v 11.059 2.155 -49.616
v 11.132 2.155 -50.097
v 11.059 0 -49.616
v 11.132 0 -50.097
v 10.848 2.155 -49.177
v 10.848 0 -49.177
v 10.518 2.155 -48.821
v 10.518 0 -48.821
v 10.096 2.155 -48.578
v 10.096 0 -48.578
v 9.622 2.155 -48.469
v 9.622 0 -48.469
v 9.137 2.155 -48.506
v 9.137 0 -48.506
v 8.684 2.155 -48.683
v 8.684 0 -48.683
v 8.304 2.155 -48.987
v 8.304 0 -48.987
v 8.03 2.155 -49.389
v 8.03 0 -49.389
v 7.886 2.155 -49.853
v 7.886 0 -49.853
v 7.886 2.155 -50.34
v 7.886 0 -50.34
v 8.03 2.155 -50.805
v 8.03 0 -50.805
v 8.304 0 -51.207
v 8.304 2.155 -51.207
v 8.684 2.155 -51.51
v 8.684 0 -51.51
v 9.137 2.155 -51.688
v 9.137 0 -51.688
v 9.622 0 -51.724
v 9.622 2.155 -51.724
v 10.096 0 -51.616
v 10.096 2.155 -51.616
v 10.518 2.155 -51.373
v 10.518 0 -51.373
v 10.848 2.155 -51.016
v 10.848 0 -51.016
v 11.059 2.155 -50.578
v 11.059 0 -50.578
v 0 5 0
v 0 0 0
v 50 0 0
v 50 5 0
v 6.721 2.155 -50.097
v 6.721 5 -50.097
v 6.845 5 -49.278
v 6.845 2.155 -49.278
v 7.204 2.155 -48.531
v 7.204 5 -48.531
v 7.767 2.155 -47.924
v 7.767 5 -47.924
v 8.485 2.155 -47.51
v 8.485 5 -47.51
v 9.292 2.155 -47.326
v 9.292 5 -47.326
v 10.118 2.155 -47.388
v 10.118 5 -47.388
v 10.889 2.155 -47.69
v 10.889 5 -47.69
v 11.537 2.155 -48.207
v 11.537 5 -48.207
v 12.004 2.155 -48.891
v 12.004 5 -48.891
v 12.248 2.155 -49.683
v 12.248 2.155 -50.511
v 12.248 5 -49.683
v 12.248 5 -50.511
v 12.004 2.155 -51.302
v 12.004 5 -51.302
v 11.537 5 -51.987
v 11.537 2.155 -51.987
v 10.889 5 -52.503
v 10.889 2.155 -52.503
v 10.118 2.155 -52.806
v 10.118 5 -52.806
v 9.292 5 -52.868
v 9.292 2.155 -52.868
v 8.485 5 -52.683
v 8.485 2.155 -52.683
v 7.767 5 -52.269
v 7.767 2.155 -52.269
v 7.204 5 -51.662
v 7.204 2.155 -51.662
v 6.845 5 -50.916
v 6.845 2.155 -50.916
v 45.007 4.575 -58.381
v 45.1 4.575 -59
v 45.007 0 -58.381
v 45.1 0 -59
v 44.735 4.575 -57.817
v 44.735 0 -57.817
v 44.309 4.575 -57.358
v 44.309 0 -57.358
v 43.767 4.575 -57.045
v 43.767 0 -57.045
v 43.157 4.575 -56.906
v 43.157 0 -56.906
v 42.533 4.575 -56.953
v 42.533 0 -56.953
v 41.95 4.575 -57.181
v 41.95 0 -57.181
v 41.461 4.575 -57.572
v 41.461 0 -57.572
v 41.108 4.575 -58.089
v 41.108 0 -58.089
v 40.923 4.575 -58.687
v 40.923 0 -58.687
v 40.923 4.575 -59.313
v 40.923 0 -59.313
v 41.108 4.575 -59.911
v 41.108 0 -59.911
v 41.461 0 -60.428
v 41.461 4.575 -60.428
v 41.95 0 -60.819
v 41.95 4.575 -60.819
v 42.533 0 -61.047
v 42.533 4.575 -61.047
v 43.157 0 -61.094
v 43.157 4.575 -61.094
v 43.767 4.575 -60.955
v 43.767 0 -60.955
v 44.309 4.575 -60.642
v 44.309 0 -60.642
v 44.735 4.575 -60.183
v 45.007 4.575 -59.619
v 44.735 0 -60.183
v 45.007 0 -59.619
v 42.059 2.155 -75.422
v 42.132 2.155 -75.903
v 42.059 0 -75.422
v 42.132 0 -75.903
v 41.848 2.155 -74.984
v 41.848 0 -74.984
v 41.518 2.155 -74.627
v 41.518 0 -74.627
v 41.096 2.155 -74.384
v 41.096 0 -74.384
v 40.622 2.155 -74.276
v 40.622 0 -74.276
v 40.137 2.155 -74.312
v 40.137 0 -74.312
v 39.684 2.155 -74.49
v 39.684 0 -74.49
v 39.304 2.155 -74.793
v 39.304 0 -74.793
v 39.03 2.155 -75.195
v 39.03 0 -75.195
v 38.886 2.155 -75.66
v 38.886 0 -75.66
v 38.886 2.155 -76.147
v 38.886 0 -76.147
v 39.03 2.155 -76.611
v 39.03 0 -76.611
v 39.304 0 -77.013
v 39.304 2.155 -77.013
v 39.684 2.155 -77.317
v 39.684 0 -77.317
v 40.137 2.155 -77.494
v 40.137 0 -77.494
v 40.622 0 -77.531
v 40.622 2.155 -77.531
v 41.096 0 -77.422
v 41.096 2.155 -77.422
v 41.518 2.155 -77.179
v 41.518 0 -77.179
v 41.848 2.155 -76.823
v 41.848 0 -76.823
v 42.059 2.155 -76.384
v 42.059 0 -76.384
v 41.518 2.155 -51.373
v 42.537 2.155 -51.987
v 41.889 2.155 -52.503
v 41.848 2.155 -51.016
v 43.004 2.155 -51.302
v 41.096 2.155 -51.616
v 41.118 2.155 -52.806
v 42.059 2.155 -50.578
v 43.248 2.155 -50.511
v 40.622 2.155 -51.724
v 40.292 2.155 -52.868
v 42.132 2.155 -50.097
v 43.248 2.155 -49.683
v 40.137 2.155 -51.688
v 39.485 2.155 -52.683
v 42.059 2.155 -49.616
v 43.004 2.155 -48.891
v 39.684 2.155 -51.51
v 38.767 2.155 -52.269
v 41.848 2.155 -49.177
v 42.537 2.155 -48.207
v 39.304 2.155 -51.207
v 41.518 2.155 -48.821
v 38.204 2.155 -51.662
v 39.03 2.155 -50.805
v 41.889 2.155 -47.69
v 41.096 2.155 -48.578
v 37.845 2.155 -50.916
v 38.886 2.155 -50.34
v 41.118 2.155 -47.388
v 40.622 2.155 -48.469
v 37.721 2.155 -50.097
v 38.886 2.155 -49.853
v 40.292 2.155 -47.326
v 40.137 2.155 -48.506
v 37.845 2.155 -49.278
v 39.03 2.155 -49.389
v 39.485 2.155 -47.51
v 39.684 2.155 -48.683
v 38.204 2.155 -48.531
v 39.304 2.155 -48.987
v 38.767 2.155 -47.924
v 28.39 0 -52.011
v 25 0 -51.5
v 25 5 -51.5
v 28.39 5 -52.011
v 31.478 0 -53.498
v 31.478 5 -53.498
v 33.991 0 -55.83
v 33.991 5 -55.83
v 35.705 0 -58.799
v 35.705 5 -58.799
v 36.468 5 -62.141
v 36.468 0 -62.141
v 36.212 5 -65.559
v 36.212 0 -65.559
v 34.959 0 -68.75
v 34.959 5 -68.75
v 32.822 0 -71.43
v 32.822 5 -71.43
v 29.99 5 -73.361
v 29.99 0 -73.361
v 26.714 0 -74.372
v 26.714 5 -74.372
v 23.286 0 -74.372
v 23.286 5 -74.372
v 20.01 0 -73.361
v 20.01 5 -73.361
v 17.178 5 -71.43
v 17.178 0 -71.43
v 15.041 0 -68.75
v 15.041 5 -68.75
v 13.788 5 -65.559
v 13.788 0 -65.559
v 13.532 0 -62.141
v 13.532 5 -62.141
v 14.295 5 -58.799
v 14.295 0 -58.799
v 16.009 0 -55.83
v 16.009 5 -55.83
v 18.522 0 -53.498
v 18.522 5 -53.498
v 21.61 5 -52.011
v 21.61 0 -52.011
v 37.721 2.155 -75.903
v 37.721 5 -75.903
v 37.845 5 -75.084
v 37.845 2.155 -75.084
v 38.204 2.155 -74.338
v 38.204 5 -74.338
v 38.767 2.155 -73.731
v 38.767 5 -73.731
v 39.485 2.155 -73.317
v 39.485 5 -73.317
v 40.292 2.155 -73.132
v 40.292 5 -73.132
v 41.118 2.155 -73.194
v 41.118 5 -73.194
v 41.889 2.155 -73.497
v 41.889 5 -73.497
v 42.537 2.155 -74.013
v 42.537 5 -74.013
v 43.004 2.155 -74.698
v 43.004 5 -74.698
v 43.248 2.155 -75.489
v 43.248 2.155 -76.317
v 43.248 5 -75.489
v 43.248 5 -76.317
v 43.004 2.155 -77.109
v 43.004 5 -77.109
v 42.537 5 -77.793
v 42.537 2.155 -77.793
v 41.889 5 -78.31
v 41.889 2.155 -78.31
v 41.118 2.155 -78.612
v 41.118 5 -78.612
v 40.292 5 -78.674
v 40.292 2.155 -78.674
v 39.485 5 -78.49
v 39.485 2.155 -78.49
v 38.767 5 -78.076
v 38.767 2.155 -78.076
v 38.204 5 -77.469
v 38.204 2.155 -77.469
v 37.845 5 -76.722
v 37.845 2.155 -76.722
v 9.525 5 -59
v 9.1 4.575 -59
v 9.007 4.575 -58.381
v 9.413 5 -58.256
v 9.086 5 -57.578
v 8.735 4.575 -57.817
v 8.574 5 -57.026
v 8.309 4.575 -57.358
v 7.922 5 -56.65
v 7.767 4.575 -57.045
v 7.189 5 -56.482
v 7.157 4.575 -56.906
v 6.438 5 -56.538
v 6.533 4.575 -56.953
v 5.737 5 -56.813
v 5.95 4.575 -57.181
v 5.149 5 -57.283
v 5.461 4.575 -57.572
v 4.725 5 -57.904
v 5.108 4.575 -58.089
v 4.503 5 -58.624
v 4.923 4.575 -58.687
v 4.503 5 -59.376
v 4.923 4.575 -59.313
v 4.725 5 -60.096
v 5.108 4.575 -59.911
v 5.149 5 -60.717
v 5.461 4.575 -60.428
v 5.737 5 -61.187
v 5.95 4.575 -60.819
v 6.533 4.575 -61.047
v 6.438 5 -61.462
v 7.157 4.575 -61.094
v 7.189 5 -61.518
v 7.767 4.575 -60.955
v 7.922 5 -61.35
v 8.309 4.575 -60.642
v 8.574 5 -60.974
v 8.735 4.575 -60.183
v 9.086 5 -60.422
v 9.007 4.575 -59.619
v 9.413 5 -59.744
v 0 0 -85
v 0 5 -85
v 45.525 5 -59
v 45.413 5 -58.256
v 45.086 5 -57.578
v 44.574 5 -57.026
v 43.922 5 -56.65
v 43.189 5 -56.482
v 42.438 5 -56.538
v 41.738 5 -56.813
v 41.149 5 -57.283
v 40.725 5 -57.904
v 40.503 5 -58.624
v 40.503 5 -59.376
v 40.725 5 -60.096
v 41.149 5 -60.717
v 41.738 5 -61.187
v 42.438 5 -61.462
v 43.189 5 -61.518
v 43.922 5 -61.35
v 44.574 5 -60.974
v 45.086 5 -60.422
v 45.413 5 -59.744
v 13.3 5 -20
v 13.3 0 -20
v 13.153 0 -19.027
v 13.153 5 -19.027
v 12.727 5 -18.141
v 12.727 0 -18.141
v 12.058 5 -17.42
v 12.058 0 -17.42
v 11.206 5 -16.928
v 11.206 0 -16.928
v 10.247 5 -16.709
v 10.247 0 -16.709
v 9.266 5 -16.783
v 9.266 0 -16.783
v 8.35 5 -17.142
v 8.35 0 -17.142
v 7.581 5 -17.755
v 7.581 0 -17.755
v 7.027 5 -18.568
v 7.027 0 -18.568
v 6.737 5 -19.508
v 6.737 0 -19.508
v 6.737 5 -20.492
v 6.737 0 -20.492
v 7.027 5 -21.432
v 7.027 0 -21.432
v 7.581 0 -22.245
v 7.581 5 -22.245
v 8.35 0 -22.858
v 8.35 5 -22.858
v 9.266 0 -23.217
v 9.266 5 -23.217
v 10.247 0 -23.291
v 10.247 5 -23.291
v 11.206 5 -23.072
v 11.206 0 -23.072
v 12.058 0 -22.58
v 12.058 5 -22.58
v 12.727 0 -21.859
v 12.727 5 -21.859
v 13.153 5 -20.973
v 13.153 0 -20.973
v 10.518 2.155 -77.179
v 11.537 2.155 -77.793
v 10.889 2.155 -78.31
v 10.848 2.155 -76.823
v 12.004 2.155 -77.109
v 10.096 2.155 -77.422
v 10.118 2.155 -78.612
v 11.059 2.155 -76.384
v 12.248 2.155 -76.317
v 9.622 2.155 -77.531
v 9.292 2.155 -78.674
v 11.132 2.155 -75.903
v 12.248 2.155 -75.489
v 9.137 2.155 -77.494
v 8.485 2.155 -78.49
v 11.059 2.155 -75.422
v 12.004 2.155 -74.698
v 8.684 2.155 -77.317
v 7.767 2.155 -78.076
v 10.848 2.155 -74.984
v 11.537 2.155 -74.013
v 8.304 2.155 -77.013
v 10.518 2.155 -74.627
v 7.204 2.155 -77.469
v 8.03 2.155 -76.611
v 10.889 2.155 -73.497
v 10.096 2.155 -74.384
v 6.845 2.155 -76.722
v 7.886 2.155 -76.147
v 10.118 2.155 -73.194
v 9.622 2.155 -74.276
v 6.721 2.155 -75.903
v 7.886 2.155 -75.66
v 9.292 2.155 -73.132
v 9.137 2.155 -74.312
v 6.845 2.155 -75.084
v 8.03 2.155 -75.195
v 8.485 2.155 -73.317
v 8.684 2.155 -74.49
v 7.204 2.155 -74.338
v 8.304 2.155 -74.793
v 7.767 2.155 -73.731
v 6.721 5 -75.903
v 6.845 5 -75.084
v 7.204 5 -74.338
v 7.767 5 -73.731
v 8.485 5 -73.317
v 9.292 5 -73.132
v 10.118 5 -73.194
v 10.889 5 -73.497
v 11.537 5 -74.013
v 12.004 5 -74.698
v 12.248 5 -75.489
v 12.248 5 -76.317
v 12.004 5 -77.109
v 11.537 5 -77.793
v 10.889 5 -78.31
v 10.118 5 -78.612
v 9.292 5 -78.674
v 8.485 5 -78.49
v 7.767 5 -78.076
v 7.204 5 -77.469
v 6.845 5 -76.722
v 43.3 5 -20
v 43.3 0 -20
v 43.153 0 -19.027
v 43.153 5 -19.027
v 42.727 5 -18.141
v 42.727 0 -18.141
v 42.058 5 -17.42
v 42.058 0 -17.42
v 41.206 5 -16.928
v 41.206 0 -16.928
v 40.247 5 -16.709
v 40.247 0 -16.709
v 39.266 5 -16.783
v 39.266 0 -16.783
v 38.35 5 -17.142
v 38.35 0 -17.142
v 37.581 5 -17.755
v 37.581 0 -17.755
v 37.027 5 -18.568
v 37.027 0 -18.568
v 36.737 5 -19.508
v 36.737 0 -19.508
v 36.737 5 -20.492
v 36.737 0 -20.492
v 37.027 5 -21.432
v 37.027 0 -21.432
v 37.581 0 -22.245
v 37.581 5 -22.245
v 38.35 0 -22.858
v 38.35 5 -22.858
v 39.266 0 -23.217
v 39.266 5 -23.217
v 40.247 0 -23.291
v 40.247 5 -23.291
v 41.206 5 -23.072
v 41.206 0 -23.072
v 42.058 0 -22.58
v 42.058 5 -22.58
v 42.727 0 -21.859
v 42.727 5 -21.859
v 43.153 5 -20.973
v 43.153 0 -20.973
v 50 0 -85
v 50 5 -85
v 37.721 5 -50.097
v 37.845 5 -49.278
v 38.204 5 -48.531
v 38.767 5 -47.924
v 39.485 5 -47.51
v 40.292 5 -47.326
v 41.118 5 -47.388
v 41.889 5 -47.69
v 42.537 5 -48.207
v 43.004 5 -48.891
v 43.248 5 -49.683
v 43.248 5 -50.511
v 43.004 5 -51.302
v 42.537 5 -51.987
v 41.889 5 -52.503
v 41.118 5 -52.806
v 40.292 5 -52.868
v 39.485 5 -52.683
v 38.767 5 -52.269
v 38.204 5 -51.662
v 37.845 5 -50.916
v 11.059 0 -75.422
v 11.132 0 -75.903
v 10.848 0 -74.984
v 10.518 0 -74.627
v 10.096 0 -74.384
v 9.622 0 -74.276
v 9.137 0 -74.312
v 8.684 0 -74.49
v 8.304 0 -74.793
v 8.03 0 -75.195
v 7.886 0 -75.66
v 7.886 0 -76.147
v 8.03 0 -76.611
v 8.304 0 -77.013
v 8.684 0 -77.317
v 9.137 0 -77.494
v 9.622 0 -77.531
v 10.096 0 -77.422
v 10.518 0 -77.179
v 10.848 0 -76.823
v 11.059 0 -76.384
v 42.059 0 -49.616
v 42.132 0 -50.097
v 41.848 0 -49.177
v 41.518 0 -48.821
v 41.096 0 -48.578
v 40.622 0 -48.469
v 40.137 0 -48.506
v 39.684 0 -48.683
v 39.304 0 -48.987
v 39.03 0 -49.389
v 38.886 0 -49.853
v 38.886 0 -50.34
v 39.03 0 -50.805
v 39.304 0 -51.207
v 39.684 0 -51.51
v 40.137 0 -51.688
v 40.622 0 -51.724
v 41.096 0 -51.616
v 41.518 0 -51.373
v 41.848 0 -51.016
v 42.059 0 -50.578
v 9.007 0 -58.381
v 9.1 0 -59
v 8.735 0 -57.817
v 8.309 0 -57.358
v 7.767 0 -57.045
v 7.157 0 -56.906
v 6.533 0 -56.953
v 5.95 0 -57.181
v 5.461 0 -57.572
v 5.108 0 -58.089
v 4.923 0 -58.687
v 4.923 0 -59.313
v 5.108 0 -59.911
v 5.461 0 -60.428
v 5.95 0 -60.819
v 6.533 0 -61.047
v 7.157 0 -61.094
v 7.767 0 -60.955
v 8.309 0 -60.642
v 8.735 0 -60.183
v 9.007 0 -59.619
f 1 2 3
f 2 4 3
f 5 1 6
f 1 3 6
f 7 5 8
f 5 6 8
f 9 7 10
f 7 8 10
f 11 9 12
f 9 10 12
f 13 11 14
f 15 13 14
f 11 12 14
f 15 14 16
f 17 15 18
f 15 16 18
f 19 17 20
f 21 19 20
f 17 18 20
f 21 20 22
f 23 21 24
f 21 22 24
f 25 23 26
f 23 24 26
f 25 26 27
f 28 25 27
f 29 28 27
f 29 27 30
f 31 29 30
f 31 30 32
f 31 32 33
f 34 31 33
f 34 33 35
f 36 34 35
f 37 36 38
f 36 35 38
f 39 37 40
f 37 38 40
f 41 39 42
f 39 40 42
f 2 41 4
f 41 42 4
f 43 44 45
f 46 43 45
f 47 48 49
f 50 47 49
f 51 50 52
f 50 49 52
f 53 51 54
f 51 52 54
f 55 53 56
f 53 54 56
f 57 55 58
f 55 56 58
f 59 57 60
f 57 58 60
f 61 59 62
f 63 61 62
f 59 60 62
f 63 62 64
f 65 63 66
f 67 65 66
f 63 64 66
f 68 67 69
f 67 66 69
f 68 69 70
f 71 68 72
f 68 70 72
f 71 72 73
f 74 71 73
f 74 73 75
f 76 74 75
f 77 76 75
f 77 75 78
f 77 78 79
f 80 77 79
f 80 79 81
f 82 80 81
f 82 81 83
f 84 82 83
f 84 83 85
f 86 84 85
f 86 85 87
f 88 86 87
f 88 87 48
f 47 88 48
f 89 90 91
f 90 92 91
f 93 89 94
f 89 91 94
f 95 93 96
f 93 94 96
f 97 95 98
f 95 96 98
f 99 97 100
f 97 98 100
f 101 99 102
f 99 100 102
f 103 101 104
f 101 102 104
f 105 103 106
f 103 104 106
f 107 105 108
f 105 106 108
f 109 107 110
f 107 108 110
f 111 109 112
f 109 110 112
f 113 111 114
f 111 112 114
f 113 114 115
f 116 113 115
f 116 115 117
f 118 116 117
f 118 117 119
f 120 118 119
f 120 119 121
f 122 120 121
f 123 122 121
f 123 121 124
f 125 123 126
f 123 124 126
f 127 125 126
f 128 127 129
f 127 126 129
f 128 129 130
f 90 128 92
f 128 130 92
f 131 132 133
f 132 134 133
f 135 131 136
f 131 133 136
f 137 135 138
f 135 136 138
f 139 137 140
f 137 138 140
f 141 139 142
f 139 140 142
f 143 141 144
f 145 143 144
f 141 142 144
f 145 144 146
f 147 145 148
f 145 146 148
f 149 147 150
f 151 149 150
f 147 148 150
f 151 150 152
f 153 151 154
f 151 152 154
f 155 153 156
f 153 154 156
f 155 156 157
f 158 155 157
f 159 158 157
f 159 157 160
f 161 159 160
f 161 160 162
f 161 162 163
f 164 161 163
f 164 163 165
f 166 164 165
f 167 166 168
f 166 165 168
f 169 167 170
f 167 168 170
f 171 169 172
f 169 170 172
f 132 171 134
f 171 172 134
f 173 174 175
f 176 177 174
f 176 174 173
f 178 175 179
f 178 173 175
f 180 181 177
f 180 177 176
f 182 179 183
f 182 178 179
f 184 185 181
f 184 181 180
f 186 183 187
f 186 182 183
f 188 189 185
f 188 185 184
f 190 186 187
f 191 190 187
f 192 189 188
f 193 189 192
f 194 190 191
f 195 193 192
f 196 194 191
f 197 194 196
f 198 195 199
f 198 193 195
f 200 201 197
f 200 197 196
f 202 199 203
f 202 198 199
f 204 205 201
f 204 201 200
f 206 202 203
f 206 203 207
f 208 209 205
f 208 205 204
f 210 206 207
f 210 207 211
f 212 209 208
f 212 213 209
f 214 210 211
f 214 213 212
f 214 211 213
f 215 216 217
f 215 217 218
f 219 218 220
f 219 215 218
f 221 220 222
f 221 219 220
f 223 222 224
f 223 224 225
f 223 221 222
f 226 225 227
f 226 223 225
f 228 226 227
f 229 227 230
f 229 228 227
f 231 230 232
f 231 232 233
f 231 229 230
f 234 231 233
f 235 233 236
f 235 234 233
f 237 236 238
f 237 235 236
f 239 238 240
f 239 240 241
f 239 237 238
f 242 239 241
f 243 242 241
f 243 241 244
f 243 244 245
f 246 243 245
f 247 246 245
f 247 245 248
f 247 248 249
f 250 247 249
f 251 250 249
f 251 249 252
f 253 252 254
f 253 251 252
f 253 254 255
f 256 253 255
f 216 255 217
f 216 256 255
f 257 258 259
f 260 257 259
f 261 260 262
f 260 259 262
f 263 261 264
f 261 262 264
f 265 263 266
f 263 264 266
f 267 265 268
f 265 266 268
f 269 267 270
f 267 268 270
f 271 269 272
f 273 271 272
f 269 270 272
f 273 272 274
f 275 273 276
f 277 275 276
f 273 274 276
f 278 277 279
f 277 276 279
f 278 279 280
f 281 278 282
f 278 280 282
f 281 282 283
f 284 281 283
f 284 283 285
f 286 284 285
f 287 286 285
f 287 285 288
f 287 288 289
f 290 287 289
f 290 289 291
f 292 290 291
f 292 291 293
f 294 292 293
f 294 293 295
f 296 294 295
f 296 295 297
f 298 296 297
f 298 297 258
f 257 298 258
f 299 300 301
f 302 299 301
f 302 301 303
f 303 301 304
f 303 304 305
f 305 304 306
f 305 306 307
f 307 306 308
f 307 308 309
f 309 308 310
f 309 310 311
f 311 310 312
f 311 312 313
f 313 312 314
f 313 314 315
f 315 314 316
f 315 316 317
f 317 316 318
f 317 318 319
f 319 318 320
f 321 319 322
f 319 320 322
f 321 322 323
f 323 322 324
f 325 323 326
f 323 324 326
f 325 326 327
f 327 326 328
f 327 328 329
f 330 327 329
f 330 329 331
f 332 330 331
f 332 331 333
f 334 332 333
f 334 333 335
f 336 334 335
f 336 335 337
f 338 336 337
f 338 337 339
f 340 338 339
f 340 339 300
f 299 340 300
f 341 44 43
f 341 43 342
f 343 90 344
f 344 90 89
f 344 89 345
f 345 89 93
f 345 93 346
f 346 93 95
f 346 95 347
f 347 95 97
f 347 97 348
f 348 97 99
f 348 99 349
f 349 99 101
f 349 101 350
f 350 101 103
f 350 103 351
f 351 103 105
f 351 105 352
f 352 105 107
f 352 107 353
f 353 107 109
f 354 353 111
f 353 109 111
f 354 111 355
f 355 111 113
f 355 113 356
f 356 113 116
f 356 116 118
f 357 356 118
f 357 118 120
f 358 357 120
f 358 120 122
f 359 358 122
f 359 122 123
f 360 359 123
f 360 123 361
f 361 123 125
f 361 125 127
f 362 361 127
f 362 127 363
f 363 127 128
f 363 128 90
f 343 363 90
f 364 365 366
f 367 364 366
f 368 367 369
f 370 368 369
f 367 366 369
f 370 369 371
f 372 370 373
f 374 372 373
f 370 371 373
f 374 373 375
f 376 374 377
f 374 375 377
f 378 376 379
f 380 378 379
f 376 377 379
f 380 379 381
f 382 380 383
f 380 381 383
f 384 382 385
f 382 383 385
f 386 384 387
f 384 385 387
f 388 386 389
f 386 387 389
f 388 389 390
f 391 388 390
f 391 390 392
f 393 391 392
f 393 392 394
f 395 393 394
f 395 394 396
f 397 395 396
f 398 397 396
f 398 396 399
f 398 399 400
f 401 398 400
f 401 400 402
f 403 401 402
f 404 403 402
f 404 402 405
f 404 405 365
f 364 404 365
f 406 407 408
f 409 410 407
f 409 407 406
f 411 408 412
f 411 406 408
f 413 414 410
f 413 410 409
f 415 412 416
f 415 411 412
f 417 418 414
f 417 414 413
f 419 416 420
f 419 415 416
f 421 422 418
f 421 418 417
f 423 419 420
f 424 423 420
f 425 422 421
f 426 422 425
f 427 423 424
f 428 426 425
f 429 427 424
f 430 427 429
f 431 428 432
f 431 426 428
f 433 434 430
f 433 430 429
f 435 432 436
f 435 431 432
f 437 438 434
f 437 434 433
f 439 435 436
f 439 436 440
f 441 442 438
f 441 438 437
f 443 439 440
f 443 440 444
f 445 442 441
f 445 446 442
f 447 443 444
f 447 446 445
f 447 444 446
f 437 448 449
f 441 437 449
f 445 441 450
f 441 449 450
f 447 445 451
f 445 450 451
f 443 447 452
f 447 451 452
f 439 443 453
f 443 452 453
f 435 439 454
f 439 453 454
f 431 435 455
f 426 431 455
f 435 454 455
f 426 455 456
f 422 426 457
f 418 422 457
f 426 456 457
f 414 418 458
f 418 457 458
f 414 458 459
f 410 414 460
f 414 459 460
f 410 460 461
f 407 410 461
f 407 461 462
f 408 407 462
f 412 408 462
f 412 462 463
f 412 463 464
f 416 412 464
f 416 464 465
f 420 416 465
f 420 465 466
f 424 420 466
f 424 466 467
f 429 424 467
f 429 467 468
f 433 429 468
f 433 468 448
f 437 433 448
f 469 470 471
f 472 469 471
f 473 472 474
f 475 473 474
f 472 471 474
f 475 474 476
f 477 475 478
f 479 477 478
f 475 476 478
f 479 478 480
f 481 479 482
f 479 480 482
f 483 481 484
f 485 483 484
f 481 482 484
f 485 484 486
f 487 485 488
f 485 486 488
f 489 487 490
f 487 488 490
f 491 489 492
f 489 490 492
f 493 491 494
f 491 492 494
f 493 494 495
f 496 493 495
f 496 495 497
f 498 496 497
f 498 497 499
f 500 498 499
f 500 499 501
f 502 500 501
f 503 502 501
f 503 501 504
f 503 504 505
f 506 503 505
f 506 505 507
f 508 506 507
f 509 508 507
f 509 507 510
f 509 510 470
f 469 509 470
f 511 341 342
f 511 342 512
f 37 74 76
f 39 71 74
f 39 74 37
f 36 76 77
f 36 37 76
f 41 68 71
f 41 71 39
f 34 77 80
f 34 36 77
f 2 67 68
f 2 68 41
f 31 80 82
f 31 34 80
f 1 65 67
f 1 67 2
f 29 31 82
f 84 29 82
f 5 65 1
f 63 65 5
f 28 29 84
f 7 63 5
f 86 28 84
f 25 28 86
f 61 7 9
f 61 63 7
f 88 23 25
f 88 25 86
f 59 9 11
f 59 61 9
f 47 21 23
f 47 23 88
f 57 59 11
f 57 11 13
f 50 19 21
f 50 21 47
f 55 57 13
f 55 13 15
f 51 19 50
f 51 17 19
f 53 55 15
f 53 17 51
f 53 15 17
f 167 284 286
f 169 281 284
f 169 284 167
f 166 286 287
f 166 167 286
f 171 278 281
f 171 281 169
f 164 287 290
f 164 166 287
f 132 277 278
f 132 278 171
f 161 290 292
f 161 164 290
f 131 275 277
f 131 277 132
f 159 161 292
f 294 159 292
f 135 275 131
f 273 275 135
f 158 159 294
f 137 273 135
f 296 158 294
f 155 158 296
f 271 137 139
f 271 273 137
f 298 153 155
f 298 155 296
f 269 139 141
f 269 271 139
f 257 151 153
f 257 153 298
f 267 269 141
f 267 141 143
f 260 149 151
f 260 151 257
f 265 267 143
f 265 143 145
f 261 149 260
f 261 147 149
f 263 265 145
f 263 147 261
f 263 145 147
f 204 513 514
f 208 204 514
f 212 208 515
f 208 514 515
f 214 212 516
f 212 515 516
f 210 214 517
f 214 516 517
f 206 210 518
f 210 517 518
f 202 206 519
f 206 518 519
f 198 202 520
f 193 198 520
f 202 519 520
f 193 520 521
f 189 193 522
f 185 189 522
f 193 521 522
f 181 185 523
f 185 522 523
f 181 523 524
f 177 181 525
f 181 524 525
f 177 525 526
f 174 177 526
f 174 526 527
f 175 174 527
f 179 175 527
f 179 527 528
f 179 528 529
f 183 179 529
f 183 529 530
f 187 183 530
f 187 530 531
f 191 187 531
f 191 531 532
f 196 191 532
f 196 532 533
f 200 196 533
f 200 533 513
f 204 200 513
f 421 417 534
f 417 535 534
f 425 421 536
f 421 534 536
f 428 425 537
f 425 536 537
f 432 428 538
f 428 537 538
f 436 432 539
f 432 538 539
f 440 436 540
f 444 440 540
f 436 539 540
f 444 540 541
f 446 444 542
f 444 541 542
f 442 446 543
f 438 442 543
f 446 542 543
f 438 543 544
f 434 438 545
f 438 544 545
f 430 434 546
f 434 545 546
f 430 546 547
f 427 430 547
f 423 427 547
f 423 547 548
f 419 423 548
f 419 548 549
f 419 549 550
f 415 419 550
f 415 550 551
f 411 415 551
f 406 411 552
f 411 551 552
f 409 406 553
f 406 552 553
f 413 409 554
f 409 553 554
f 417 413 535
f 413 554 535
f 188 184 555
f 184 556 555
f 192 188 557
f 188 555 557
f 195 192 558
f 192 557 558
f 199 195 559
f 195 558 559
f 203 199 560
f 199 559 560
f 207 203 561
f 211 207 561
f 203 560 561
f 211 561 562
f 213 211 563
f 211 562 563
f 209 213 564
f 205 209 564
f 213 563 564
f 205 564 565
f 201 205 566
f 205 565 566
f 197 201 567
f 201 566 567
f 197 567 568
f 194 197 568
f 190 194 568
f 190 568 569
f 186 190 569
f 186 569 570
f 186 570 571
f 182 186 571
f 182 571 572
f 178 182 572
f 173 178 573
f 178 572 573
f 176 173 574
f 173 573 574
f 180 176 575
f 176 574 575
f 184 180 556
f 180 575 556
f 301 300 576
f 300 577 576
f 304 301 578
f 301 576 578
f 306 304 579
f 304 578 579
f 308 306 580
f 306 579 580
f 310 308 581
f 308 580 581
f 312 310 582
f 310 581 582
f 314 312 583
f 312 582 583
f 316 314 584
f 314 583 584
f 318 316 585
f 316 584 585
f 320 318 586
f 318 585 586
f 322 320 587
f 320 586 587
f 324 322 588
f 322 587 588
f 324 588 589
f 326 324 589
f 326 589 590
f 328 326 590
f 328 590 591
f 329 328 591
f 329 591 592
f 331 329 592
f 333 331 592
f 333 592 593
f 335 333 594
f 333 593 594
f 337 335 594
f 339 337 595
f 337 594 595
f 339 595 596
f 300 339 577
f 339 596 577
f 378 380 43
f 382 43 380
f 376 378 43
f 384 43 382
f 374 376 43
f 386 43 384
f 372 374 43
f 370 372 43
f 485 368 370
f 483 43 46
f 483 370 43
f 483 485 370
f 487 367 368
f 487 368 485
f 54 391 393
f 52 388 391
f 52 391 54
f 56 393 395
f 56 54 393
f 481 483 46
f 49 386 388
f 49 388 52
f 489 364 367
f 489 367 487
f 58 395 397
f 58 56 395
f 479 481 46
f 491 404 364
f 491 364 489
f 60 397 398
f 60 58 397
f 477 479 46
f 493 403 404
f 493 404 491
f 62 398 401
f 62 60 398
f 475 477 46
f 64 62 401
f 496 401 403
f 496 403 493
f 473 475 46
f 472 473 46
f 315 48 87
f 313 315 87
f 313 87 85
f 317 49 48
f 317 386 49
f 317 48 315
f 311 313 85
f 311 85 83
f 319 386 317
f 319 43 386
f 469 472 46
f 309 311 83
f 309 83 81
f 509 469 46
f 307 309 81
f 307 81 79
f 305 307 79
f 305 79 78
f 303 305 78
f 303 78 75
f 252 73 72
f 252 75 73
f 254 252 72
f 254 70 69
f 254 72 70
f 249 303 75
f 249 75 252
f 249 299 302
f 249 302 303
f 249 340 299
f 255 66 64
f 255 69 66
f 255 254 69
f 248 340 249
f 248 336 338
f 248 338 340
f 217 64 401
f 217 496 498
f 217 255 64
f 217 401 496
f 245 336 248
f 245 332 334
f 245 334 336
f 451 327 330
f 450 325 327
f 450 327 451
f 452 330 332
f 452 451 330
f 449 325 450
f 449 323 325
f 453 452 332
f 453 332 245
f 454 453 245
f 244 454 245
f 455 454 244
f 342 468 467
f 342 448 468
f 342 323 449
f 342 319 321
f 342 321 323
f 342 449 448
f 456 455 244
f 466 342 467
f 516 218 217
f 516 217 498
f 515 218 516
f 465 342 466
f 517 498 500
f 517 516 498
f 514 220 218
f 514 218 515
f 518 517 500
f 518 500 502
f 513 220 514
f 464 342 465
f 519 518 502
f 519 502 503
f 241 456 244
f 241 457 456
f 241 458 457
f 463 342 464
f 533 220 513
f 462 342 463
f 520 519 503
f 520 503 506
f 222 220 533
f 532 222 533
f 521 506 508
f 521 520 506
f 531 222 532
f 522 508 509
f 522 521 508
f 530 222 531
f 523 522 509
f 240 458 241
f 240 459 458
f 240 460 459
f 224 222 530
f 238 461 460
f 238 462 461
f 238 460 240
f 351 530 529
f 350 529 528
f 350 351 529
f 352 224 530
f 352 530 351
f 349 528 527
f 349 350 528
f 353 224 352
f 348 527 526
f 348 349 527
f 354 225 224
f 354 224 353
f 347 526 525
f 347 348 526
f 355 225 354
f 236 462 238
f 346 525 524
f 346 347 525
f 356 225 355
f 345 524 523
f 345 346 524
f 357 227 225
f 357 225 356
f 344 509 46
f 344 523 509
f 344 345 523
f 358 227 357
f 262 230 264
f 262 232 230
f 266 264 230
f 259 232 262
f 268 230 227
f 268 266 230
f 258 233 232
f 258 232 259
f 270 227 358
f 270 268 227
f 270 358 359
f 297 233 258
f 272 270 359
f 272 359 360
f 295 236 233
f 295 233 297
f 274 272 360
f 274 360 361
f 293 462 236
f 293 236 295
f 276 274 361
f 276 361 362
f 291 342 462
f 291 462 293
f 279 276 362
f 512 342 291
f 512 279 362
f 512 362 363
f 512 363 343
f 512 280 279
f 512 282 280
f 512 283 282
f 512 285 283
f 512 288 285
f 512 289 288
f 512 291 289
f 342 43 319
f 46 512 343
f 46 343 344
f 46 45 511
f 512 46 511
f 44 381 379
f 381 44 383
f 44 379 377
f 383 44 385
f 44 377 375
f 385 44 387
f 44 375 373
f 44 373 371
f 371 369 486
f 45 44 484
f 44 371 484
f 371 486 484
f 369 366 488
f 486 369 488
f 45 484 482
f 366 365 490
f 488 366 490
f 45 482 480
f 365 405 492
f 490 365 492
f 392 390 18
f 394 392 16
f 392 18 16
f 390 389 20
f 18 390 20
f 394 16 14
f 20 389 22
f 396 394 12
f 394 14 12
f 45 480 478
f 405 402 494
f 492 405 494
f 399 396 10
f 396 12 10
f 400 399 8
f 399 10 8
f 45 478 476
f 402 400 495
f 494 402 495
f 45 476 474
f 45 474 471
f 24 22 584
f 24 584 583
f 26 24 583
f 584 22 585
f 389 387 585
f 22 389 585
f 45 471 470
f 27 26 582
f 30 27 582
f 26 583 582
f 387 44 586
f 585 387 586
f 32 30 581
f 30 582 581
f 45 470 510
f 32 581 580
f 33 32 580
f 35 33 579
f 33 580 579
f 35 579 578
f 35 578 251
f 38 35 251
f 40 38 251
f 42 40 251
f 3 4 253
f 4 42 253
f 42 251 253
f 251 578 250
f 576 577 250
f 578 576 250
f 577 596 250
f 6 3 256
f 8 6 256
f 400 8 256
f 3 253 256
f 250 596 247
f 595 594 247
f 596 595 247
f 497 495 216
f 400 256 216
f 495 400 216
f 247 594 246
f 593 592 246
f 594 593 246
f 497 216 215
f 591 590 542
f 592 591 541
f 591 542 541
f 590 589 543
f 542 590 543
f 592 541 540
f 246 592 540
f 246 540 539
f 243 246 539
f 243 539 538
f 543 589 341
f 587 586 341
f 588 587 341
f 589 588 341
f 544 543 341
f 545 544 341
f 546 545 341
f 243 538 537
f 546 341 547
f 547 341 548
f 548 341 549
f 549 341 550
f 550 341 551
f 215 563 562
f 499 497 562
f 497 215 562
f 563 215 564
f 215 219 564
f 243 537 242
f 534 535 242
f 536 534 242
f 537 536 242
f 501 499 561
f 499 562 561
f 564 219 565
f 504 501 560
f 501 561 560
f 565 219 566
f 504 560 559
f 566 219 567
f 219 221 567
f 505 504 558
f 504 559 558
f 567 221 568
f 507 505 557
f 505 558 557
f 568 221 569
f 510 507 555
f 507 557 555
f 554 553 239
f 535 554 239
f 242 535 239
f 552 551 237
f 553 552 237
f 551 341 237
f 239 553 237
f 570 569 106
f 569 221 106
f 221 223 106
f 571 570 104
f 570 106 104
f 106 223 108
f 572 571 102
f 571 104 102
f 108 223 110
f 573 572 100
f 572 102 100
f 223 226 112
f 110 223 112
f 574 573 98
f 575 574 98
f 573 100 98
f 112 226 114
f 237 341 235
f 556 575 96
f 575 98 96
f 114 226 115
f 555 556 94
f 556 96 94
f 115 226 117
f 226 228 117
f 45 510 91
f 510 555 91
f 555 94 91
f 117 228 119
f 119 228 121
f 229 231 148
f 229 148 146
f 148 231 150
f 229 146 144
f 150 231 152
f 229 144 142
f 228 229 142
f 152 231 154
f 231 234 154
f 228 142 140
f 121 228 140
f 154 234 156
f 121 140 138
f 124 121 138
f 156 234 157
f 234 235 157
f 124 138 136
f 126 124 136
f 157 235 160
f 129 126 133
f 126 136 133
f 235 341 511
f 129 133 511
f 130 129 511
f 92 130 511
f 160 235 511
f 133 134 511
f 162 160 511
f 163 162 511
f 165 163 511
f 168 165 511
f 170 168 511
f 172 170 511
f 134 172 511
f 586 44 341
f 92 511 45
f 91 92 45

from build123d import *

# Parameters (mm, degrees)
SKETCH1_W                                      = 50
SKETCH1_H                                      = 85
SKETCH1_R                                      = 11.5
BOSS_EXTRUDE1_DEPTH                            = 5
CBORE_FOR_4_SOCKET_HEAD_CAP_SCREW1_D           = 3.2639
CBORE_FOR_4_SOCKET_HEAD_CAP_SCREW1_CBORE_D     = 5.55752
CBORE_FOR_4_SOCKET_HEAD_CAP_SCREW1_CBORE_DEPTH = 2.8448
M6_CLEARANCE_HOLE1_D                           = 6.6
M5_TAPPED_HOLE1_D                              = 4.2
M5_TAPPED_HOLE1_CSINK_D                        = 5.05
M5_TAPPED_HOLE1_CSINK_ANGLE                    = 90


with BuildPart() as part:
    # Sketch1 → Boss-Extrude1 (new body)
    with BuildSketch(Plane(origin=(0, 0, 0), x_dir=(1, 0, 0), z_dir=(0, 1, 0))):
        with Locations((25, 42.5)):
            Rectangle(SKETCH1_W, SKETCH1_H)
        with Locations(Location((25, 63, 0), (0, 0, 270))):
            Circle(SKETCH1_R, mode=Mode.SUBTRACT)
    extrude(amount=BOSS_EXTRUDE1_DEPTH)

    # CBORE for #4 Socket Head Cap Screw1 (through all)
    with Locations(Plane(origin=(0, 5, 0), x_dir=(-1, 0, 0), z_dir=(0, 1, 0))):
        with Locations((-9.5, -75.903324015), (-9.5, -50.096675985), (-40.5, -50.096675985), (-40.5, -75.903324015)):
            CounterBoreHole(CBORE_FOR_4_SOCKET_HEAD_CAP_SCREW1_D / 2, CBORE_FOR_4_SOCKET_HEAD_CAP_SCREW1_CBORE_D / 2, CBORE_FOR_4_SOCKET_HEAD_CAP_SCREW1_CBORE_DEPTH)

    # M6 Clearance Hole1 (through all)
    with Locations(Plane(origin=(0, 5, 0), x_dir=(-1, 0, 0), z_dir=(0, 1, 0))):
        with Locations((-10, -20), (-40, -20)):
            Hole(M6_CLEARANCE_HOLE1_D / 2)

    # M5 Tapped Hole1 (through all)
    with Locations(Plane(origin=(0, 5, 0), x_dir=(-1, 0, 0), z_dir=(0, 1, 0))):
        with Locations((-7, -59), (-43, -59)):
            CounterSinkHole(M5_TAPPED_HOLE1_D / 2, M5_TAPPED_HOLE1_CSINK_D / 2, counter_sink_angle=M5_TAPPED_HOLE1_CSINK_ANGLE)


solid = part.part
